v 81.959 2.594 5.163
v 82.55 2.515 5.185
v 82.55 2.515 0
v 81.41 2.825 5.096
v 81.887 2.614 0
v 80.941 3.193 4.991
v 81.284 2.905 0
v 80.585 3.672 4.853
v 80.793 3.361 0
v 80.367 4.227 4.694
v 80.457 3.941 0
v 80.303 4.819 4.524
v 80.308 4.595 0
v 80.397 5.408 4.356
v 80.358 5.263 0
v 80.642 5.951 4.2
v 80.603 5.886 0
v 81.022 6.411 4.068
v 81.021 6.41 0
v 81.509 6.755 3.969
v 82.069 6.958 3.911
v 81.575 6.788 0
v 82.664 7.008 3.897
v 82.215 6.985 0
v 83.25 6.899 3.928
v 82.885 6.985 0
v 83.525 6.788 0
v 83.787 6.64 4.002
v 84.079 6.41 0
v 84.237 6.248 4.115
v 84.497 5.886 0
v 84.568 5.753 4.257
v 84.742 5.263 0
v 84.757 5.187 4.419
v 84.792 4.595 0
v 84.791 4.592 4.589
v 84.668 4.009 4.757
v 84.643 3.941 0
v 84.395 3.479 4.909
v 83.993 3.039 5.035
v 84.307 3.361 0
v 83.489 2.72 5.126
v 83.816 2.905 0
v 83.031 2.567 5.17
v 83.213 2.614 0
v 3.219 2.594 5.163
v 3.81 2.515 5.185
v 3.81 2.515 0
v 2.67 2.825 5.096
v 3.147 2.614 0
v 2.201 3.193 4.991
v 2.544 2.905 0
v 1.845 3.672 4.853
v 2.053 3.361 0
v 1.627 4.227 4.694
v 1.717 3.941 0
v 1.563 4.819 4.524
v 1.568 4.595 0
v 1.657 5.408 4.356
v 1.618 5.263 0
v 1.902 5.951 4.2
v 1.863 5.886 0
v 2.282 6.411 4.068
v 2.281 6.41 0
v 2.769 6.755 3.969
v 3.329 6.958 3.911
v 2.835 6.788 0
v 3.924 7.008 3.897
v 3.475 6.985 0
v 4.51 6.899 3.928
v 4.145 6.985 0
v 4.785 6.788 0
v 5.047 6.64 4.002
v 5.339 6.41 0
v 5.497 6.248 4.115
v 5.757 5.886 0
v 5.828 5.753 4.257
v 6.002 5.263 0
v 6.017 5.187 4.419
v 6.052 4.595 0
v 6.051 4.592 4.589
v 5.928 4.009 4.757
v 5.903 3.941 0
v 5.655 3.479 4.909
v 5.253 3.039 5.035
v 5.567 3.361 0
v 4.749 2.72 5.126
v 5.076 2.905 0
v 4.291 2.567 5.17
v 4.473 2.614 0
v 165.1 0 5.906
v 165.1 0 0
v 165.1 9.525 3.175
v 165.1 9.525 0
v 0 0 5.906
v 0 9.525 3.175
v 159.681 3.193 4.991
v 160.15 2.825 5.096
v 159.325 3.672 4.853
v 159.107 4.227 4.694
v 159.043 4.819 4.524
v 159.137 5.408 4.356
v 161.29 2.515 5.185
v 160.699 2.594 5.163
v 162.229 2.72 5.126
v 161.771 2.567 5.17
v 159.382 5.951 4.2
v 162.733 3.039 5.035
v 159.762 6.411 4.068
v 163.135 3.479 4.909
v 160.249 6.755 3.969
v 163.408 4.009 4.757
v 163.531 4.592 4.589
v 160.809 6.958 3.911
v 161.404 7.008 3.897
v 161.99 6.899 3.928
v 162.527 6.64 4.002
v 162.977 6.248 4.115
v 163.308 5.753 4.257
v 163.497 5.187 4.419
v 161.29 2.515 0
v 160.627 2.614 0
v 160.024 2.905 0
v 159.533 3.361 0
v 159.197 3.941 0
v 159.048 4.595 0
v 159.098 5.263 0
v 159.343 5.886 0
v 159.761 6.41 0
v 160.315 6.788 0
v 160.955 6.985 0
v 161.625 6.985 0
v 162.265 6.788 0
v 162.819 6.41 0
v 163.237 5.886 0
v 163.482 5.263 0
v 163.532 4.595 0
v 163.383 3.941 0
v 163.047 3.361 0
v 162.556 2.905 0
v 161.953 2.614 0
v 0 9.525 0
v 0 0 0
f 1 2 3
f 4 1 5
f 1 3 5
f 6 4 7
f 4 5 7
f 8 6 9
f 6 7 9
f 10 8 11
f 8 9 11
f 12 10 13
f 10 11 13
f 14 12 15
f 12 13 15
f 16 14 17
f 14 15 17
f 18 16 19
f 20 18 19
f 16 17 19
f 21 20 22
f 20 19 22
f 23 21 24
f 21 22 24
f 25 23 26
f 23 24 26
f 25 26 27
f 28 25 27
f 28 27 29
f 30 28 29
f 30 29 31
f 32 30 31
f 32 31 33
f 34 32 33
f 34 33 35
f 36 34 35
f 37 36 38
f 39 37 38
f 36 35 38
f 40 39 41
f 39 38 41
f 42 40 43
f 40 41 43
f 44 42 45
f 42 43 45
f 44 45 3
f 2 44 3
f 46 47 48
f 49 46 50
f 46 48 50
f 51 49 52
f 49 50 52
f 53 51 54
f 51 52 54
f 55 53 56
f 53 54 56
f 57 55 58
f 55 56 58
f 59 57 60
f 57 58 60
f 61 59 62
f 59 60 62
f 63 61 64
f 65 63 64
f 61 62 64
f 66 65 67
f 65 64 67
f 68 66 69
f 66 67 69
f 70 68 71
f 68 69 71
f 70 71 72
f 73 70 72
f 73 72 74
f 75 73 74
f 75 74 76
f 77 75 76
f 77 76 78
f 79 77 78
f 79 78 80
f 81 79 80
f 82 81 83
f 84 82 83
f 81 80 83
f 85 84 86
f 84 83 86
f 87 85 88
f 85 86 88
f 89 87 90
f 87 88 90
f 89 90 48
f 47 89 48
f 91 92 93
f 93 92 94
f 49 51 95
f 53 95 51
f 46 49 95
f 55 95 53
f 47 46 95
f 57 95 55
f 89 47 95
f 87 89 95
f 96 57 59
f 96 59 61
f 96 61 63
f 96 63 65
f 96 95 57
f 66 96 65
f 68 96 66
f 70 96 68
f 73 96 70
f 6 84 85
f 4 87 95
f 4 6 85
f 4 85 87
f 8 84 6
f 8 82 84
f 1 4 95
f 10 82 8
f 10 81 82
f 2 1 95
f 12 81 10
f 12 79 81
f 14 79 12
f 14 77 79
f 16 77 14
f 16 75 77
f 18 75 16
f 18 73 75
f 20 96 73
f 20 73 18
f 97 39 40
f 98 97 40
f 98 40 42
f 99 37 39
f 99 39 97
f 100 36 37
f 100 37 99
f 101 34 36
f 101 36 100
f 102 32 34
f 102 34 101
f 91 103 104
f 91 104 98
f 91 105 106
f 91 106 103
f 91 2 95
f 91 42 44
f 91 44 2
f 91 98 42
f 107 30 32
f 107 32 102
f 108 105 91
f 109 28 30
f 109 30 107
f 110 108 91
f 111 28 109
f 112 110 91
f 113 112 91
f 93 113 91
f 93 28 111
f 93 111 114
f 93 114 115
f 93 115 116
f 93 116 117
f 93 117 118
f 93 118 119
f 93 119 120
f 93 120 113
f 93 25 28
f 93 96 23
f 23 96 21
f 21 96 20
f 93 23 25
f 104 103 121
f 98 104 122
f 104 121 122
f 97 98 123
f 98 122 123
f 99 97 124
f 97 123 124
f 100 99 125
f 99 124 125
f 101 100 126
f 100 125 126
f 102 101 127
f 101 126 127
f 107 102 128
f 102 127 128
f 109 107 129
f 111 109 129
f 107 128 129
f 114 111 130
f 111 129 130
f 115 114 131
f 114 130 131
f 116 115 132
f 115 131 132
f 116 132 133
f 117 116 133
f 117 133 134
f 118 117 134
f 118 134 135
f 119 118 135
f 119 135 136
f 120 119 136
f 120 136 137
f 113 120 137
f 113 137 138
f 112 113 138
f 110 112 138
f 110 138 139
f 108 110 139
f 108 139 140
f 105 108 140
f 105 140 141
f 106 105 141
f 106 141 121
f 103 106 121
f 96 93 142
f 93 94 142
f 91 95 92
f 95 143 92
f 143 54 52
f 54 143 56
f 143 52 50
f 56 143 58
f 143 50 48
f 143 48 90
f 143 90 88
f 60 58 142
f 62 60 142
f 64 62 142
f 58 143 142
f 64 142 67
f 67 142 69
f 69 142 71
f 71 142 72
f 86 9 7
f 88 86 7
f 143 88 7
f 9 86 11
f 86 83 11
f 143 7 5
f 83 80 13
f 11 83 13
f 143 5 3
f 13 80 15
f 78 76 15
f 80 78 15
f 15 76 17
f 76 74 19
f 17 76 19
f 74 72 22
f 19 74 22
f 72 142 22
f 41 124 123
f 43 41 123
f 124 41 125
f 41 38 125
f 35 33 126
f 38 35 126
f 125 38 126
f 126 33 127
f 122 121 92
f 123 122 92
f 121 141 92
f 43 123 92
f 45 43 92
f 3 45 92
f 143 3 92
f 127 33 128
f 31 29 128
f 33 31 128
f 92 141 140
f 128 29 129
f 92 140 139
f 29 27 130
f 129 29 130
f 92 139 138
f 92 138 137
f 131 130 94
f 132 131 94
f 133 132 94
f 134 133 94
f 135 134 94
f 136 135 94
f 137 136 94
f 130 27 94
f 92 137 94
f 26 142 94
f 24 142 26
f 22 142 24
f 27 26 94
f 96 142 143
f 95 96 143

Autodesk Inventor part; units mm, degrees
ref_plane "YZ Plane" through (0, 0, 0) normal (1, 0, 0) x (0, 1, 0)
ref_plane "XZ Plane" through (0, 0, 0) normal (0, 1, 0) x (-1, 0, 0)
ref_plane "XY Plane" through (0, 0, 0) normal (0, 0, 1) x (1, 0, 0)
sketch "Sketch1" plane through (0, 0, 0) normal (0, 0, 1) x (1, 0, 0)
  line L0 (0, 0) -> (165.1, 0)
  line L1 (165.1, 0) -> (165.1, 9.525)
  line L2 (165.1, 9.525) -> (0, 9.525)
  line L3 (0, 9.525) -> (0, 0)
  dimension "d0" = 165.1
  dimension "d1" = 9.525
extrude "Extrusion1" add sketch "Sketch1" along normal blind 3.175
sketch "Sketch2" plane through (0, 0, 3.175) normal (0, 0, 1) x (1, 0, 0)
  line L0 (165.1, 9.525) -> (0, 9.525) projected
  line L1 (0, 9.525) -> (0, 0) projected
  circle A0 centre (3.81, 4.7625) radius 0.5592
  point P0 (82.55, 4.7625)
  point P1 (161.29, 4.7625)
  dimension "d4" = 3.81
  dimension "d5" = 4.7625
  dimension "d8" = 78.74
hole "Hole1" at (3.81, 4.7625, 3.175) at (82.55, 4.7625, 3.175) at (161.29, 4.7625, 3.175) direction (0, 0, -1) diameter 4.4958 end through all clearance for "Flat Head Machine Screw" size "M4" standard "Ansi Metric M Profile"
draft "FaceDraft3" angle 16 pull direction (0, 1, 0) faces at (82.55, 0.8382, 3.175) fixed edges at (82.55, 9.525, 3.175)
properties part number "bar"
